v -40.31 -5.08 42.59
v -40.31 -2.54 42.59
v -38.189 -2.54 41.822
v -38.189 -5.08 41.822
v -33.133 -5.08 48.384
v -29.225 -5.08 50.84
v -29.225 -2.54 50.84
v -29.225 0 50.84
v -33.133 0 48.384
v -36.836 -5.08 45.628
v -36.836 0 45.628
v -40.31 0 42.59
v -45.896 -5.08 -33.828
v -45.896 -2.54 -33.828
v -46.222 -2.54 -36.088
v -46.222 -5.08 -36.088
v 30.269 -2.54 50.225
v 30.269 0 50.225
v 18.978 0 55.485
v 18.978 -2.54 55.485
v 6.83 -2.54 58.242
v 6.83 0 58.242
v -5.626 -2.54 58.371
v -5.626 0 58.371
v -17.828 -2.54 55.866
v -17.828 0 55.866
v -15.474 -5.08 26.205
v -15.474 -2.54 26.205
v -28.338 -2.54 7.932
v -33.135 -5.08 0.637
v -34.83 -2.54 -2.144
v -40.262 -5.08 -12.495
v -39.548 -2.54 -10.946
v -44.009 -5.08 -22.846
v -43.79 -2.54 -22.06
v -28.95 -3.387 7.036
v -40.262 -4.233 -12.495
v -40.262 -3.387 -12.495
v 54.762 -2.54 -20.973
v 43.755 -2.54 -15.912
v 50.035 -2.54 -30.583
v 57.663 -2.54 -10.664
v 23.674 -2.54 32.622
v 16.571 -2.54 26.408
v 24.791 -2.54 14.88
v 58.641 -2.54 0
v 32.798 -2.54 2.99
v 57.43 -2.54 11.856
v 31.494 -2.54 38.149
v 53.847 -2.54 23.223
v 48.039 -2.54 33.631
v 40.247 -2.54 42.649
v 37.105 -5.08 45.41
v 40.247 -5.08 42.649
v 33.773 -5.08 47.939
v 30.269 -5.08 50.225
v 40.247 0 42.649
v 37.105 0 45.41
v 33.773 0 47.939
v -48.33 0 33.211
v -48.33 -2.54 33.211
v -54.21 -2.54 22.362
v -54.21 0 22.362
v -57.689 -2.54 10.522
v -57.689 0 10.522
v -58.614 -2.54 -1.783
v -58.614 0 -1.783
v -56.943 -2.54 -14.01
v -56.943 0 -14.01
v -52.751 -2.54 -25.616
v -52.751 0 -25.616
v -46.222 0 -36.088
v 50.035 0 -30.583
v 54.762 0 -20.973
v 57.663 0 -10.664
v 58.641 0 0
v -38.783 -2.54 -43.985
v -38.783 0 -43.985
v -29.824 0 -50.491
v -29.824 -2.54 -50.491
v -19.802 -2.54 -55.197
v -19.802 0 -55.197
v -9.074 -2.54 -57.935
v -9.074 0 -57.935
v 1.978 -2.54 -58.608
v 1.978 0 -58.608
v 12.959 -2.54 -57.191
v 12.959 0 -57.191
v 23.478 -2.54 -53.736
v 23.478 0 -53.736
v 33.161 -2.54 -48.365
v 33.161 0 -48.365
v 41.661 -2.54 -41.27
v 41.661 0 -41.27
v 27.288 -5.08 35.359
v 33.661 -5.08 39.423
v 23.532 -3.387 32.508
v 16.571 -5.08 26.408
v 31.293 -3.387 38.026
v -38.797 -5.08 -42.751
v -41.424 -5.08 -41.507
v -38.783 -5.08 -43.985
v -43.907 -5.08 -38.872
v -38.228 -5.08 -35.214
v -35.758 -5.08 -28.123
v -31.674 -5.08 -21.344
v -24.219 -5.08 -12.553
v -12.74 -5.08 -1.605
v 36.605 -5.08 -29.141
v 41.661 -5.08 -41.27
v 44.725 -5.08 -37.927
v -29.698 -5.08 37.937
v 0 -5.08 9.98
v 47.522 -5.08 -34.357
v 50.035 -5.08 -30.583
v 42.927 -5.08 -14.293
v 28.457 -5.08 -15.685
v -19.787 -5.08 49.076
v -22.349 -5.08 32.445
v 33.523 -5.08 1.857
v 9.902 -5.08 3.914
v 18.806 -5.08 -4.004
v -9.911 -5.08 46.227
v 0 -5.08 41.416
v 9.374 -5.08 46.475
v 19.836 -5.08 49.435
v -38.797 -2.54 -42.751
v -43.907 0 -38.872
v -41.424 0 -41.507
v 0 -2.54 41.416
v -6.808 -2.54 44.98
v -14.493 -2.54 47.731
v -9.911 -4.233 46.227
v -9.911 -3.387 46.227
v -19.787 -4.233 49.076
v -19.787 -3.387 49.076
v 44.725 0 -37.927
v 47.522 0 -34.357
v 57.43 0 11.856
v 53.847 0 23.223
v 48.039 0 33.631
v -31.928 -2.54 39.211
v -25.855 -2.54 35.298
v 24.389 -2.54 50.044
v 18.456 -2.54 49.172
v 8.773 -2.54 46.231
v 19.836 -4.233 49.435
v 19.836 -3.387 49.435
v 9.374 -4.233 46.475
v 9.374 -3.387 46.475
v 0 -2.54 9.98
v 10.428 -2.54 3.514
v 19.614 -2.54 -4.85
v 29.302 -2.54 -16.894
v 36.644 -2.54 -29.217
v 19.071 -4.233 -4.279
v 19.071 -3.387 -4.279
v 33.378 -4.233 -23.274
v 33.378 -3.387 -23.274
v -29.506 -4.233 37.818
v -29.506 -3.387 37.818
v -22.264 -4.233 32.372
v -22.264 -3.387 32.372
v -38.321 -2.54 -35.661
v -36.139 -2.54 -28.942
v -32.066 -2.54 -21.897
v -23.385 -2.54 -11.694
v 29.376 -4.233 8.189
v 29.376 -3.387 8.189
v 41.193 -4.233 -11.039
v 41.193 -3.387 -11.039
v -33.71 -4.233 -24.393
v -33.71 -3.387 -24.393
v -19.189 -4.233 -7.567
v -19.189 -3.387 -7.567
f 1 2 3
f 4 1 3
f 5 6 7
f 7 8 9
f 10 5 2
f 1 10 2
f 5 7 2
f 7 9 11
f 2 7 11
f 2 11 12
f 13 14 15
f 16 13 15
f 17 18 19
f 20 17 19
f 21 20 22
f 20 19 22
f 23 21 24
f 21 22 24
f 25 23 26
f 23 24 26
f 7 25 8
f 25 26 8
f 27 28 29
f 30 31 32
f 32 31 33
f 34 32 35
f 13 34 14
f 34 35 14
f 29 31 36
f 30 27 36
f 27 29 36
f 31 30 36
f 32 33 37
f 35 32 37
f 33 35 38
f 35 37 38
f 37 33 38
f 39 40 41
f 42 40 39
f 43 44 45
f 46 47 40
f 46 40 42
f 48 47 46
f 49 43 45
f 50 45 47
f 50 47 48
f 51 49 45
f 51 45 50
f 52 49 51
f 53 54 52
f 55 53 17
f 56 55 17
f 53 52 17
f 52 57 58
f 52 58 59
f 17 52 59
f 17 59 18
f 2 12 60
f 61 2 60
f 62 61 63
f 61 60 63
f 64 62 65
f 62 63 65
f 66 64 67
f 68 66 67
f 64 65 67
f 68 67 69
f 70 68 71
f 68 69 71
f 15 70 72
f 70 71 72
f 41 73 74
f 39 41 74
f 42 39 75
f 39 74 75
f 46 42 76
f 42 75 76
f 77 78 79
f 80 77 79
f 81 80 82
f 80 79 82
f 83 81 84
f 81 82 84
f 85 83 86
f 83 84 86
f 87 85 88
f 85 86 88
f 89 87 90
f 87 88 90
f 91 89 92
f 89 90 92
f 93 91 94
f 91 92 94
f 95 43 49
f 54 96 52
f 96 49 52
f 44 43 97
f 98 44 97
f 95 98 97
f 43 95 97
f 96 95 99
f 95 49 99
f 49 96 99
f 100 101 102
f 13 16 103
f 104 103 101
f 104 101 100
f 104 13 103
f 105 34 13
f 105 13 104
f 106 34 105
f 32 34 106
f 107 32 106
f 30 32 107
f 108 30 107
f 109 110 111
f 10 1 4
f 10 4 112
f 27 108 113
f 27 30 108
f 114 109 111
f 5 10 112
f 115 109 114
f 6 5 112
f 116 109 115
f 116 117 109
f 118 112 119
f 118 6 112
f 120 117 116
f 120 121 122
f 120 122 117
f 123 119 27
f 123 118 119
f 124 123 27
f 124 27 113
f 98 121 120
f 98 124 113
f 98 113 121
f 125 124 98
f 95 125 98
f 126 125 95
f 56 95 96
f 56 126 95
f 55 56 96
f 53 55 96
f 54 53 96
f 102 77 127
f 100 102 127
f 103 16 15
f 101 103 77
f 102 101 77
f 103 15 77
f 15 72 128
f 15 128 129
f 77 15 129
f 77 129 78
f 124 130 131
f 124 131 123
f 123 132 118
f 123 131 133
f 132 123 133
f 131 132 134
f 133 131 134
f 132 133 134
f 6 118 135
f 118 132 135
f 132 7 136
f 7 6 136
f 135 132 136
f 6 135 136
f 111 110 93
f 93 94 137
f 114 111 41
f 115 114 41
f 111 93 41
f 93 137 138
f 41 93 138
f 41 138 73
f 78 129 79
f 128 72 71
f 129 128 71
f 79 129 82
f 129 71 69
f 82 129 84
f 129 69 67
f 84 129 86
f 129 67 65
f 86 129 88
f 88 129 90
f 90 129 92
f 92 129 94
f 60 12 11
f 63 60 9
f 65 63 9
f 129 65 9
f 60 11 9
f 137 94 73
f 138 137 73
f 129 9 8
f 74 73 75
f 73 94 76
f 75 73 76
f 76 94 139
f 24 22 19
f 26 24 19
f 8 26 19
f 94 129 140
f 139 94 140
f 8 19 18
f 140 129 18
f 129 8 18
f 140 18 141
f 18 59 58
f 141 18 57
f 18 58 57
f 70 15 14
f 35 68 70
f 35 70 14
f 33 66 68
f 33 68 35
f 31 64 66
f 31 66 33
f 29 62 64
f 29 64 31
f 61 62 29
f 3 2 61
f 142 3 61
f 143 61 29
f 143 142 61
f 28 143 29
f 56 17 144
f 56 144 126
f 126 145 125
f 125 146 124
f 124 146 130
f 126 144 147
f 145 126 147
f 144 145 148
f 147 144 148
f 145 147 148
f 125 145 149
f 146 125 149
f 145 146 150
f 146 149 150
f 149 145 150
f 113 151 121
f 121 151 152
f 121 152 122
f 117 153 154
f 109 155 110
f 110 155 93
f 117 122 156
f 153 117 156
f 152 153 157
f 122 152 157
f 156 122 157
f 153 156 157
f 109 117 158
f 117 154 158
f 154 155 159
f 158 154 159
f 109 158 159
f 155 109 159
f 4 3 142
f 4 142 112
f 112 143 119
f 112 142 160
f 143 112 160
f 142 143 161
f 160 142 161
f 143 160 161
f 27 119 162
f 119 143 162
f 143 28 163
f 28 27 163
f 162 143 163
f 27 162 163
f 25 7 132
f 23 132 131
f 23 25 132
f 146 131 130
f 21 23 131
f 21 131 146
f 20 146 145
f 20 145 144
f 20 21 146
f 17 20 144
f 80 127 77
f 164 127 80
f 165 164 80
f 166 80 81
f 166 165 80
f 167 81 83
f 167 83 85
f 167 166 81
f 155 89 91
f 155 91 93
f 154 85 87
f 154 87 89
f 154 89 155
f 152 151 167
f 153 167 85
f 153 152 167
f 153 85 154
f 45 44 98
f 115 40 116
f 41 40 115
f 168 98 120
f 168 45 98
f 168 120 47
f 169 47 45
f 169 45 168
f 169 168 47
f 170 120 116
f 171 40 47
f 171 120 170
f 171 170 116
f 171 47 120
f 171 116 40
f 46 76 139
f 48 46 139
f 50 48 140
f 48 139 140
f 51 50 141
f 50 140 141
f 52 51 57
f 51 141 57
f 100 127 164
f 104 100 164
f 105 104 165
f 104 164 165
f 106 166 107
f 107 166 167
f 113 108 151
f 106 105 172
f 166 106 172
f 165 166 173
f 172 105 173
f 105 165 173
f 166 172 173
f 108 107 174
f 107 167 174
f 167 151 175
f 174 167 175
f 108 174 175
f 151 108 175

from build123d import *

# Parameters (mm, degrees)
F1_DEPTH = 2.54
F2_DEPTH = 5.08


with BuildPart() as f1:
    # F0 (on Front) → F1 (new body)
    with BuildSketch(Plane.XZ):
        with BuildLine():
            ThreePointArc((50.034948, -30.582519), (56.448624, -15.885194), (58.641167, 0))
            ThreePointArc((58.641167, 0), (53.846731, 23.223178), (40.2474, 42.648954))
            add(Edge.make_bspline(
                [(16.570685, 26.408125), (23.263536, 32.695353), (30.564828, 38.576946), (40.2474, 42.648954)],
                knots=[0, 0, 0, 0, 28.711519, 28.711519, 28.711519, 28.711519], degree=3))
            add(Edge.make_bspline(
                [(16.570685, 26.408125), (29.209305, 8.924421), (43.342095, -11.112408), (50.034948, -30.582519)],
                knots=[0, 0, 0, 0, 66.08926, 66.08926, 66.08926, 66.08926], degree=3))
        make_face()
        with BuildLine():
            add(Edge.make_bspline(
                [(16.570685, 26.408125), (23.263536, 32.695353), (30.564828, 38.576946), (40.2474, 42.648954)],
                knots=[0, 0, 0, 0, 28.711519, 28.711519, 28.711519, 28.711519], degree=3))
            ThreePointArc((40.2474, 42.648954), (35.461347, 46.704169), (30.269499, 50.224933))
            add(Edge.make_bspline(
                [(30.269499, 50.224933), (20.221332, 50.542954), (8.458137, 47.500748), (0, 41.41634)],
                knots=[0, 0, 0, 0, 31.525131, 31.525131, 31.525131, 31.525131], degree=3))
            add(Edge.make_bspline(
                [(0, 41.41634), (-9.795095, 47.500748), (-20.138593, 49.326073), (-29.225386, 50.839584)],
                knots=[0, 0, 0, 0, 30.707014, 30.707014, 30.707014, 30.707014], degree=3))
            ThreePointArc((-29.225386, 50.839584), (-35.011661, 47.042216), (-40.310237, 42.589568))
            Line((-40.310237, 42.589568), (-38.189009, 41.821968))
            add(Edge.make_bspline(
                [(-38.189009, 41.821968), (-28.453952, 38.779758), (-22.369543, 32.492537), (-15.473878, 26.205312)],
                knots=[0, 0, 0, 0, 27.565505, 27.565505, 27.565505, 27.565505], degree=3))
            add(Edge.make_bspline(
                [(-15.473878, 26.205312), (-28.859582, 6.735198), (-44.273421, -11.112408), (-45.89593, -33.82754)],
                knots=[0, 0, 0, 0, 67.301148, 67.301148, 67.301148, 67.301148], degree=3))
            Line((-45.89593, -33.82754), (-46.222024, -36.087546))
            ThreePointArc((-46.222024, -36.087546), (-42.685571, -40.208562), (-38.783069, -43.98477))
            Line((-38.783069, -43.98477), (-38.797453, -42.751342))
            add(Edge.make_bspline(
                [(-38.797453, -42.751342), (-40.014334, -22.875601), (-19.935779, -8.678642), (0, 9.980217)],
                knots=[0, 0, 0, 0, 65.466477, 65.466477, 65.466477, 65.466477], degree=3))
            add(Edge.make_bspline(
                [(0, 9.980217), (21.032587, 0), (36.810137, -25.684895), (41.660637, -41.269574)],
                knots=[0, 0, 0, 0, 66.046573, 66.046573, 66.046573, 66.046573], degree=3))
            ThreePointArc((41.660637, -41.269574), (46.158134, -36.169229), (50.034948, -30.582519))
            add(Edge.make_bspline(
                [(16.570685, 26.408125), (29.209305, 8.924421), (43.342095, -11.112408), (50.034948, -30.582519)],
                knots=[0, 0, 0, 0, 66.08926, 66.08926, 66.08926, 66.08926], degree=3))
        make_face()
        with BuildLine():
            add(Edge.make_bspline(
                [(30.269499, 50.224933), (20.221332, 50.542954), (8.458137, 47.500748), (0, 41.41634)],
                knots=[0, 0, 0, 0, 31.525131, 31.525131, 31.525131, 31.525131], degree=3))
            ThreePointArc((30.269499, 50.224933), (0.605799, 58.638038), (-29.225386, 50.839584))
            add(Edge.make_bspline(
                [(0, 41.41634), (-9.795095, 47.500748), (-20.138593, 49.326073), (-29.225386, 50.839584)],
                knots=[0, 0, 0, 0, 30.707014, 30.707014, 30.707014, 30.707014], degree=3))
        make_face()
        with BuildLine():
            ThreePointArc((-38.783069, -43.98477), (1.978174, -58.607792), (41.660637, -41.269574))
            add(Edge.make_bspline(
                [(0, 9.980217), (21.032587, 0), (36.810137, -25.684895), (41.660637, -41.269574)],
                knots=[0, 0, 0, 0, 66.046573, 66.046573, 66.046573, 66.046573], degree=3))
            add(Edge.make_bspline(
                [(-38.797453, -42.751342), (-40.014334, -22.875601), (-19.935779, -8.678642), (0, 9.980217)],
                knots=[0, 0, 0, 0, 65.466477, 65.466477, 65.466477, 65.466477], degree=3))
            Line((-38.797453, -42.751342), (-38.783069, -43.98477))
        make_face()
        with BuildLine():
            Line((-38.189009, 41.821968), (-40.310237, 42.589568))
            ThreePointArc((-40.310237, 42.589568), (-58.476321, 4.393902), (-46.222024, -36.087546))
            Line((-46.222024, -36.087546), (-45.89593, -33.82754))
            add(Edge.make_bspline(
                [(-15.473878, 26.205312), (-28.859582, 6.735198), (-44.273421, -11.112408), (-45.89593, -33.82754)],
                knots=[0, 0, 0, 0, 67.301148, 67.301148, 67.301148, 67.301148], degree=3))
            add(Edge.make_bspline(
                [(-38.189009, 41.821968), (-28.453952, 38.779758), (-22.369543, 32.492537), (-15.473878, 26.205312)],
                knots=[0, 0, 0, 0, 27.565505, 27.565505, 27.565505, 27.565505], degree=3))
        make_face()
    extrude(amount=F1_DEPTH)

    # F0 (on Front) → F2 (join)
    with BuildSketch(Plane.XZ):
        with BuildLine():
            add(Edge.make_bspline(
                [(16.570685, 26.408125), (23.263536, 32.695353), (30.564828, 38.576946), (40.2474, 42.648954)],
                knots=[0, 0, 0, 0, 28.711519, 28.711519, 28.711519, 28.711519], degree=3))
            ThreePointArc((40.2474, 42.648954), (35.461347, 46.704169), (30.269499, 50.224933))
            add(Edge.make_bspline(
                [(30.269499, 50.224933), (20.221332, 50.542954), (8.458137, 47.500748), (0, 41.41634)],
                knots=[0, 0, 0, 0, 31.525131, 31.525131, 31.525131, 31.525131], degree=3))
            add(Edge.make_bspline(
                [(0, 41.41634), (-9.795095, 47.500748), (-20.138593, 49.326073), (-29.225386, 50.839584)],
                knots=[0, 0, 0, 0, 30.707014, 30.707014, 30.707014, 30.707014], degree=3))
            ThreePointArc((-29.225386, 50.839584), (-35.011661, 47.042216), (-40.310237, 42.589568))
            Line((-40.310237, 42.589568), (-38.189009, 41.821968))
            add(Edge.make_bspline(
                [(-38.189009, 41.821968), (-28.453952, 38.779758), (-22.369543, 32.492537), (-15.473878, 26.205312)],
                knots=[0, 0, 0, 0, 27.565505, 27.565505, 27.565505, 27.565505], degree=3))
            add(Edge.make_bspline(
                [(-15.473878, 26.205312), (-28.859582, 6.735198), (-44.273421, -11.112408), (-45.89593, -33.82754)],
                knots=[0, 0, 0, 0, 67.301148, 67.301148, 67.301148, 67.301148], degree=3))
            Line((-45.89593, -33.82754), (-46.222024, -36.087546))
            ThreePointArc((-46.222024, -36.087546), (-42.685571, -40.208562), (-38.783069, -43.98477))
            Line((-38.783069, -43.98477), (-38.797453, -42.751342))
            add(Edge.make_bspline(
                [(-38.797453, -42.751342), (-40.014334, -22.875601), (-19.935779, -8.678642), (0, 9.980217)],
                knots=[0, 0, 0, 0, 65.466477, 65.466477, 65.466477, 65.466477], degree=3))
            add(Edge.make_bspline(
                [(0, 9.980217), (21.032587, 0), (36.810137, -25.684895), (41.660637, -41.269574)],
                knots=[0, 0, 0, 0, 66.046573, 66.046573, 66.046573, 66.046573], degree=3))
            ThreePointArc((41.660637, -41.269574), (46.158134, -36.169229), (50.034948, -30.582519))
            add(Edge.make_bspline(
                [(16.570685, 26.408125), (29.209305, 8.924421), (43.342095, -11.112408), (50.034948, -30.582519)],
                knots=[0, 0, 0, 0, 66.08926, 66.08926, 66.08926, 66.08926], degree=3))
        make_face()
    extrude(amount=F2_DEPTH)


solid = f1.part
